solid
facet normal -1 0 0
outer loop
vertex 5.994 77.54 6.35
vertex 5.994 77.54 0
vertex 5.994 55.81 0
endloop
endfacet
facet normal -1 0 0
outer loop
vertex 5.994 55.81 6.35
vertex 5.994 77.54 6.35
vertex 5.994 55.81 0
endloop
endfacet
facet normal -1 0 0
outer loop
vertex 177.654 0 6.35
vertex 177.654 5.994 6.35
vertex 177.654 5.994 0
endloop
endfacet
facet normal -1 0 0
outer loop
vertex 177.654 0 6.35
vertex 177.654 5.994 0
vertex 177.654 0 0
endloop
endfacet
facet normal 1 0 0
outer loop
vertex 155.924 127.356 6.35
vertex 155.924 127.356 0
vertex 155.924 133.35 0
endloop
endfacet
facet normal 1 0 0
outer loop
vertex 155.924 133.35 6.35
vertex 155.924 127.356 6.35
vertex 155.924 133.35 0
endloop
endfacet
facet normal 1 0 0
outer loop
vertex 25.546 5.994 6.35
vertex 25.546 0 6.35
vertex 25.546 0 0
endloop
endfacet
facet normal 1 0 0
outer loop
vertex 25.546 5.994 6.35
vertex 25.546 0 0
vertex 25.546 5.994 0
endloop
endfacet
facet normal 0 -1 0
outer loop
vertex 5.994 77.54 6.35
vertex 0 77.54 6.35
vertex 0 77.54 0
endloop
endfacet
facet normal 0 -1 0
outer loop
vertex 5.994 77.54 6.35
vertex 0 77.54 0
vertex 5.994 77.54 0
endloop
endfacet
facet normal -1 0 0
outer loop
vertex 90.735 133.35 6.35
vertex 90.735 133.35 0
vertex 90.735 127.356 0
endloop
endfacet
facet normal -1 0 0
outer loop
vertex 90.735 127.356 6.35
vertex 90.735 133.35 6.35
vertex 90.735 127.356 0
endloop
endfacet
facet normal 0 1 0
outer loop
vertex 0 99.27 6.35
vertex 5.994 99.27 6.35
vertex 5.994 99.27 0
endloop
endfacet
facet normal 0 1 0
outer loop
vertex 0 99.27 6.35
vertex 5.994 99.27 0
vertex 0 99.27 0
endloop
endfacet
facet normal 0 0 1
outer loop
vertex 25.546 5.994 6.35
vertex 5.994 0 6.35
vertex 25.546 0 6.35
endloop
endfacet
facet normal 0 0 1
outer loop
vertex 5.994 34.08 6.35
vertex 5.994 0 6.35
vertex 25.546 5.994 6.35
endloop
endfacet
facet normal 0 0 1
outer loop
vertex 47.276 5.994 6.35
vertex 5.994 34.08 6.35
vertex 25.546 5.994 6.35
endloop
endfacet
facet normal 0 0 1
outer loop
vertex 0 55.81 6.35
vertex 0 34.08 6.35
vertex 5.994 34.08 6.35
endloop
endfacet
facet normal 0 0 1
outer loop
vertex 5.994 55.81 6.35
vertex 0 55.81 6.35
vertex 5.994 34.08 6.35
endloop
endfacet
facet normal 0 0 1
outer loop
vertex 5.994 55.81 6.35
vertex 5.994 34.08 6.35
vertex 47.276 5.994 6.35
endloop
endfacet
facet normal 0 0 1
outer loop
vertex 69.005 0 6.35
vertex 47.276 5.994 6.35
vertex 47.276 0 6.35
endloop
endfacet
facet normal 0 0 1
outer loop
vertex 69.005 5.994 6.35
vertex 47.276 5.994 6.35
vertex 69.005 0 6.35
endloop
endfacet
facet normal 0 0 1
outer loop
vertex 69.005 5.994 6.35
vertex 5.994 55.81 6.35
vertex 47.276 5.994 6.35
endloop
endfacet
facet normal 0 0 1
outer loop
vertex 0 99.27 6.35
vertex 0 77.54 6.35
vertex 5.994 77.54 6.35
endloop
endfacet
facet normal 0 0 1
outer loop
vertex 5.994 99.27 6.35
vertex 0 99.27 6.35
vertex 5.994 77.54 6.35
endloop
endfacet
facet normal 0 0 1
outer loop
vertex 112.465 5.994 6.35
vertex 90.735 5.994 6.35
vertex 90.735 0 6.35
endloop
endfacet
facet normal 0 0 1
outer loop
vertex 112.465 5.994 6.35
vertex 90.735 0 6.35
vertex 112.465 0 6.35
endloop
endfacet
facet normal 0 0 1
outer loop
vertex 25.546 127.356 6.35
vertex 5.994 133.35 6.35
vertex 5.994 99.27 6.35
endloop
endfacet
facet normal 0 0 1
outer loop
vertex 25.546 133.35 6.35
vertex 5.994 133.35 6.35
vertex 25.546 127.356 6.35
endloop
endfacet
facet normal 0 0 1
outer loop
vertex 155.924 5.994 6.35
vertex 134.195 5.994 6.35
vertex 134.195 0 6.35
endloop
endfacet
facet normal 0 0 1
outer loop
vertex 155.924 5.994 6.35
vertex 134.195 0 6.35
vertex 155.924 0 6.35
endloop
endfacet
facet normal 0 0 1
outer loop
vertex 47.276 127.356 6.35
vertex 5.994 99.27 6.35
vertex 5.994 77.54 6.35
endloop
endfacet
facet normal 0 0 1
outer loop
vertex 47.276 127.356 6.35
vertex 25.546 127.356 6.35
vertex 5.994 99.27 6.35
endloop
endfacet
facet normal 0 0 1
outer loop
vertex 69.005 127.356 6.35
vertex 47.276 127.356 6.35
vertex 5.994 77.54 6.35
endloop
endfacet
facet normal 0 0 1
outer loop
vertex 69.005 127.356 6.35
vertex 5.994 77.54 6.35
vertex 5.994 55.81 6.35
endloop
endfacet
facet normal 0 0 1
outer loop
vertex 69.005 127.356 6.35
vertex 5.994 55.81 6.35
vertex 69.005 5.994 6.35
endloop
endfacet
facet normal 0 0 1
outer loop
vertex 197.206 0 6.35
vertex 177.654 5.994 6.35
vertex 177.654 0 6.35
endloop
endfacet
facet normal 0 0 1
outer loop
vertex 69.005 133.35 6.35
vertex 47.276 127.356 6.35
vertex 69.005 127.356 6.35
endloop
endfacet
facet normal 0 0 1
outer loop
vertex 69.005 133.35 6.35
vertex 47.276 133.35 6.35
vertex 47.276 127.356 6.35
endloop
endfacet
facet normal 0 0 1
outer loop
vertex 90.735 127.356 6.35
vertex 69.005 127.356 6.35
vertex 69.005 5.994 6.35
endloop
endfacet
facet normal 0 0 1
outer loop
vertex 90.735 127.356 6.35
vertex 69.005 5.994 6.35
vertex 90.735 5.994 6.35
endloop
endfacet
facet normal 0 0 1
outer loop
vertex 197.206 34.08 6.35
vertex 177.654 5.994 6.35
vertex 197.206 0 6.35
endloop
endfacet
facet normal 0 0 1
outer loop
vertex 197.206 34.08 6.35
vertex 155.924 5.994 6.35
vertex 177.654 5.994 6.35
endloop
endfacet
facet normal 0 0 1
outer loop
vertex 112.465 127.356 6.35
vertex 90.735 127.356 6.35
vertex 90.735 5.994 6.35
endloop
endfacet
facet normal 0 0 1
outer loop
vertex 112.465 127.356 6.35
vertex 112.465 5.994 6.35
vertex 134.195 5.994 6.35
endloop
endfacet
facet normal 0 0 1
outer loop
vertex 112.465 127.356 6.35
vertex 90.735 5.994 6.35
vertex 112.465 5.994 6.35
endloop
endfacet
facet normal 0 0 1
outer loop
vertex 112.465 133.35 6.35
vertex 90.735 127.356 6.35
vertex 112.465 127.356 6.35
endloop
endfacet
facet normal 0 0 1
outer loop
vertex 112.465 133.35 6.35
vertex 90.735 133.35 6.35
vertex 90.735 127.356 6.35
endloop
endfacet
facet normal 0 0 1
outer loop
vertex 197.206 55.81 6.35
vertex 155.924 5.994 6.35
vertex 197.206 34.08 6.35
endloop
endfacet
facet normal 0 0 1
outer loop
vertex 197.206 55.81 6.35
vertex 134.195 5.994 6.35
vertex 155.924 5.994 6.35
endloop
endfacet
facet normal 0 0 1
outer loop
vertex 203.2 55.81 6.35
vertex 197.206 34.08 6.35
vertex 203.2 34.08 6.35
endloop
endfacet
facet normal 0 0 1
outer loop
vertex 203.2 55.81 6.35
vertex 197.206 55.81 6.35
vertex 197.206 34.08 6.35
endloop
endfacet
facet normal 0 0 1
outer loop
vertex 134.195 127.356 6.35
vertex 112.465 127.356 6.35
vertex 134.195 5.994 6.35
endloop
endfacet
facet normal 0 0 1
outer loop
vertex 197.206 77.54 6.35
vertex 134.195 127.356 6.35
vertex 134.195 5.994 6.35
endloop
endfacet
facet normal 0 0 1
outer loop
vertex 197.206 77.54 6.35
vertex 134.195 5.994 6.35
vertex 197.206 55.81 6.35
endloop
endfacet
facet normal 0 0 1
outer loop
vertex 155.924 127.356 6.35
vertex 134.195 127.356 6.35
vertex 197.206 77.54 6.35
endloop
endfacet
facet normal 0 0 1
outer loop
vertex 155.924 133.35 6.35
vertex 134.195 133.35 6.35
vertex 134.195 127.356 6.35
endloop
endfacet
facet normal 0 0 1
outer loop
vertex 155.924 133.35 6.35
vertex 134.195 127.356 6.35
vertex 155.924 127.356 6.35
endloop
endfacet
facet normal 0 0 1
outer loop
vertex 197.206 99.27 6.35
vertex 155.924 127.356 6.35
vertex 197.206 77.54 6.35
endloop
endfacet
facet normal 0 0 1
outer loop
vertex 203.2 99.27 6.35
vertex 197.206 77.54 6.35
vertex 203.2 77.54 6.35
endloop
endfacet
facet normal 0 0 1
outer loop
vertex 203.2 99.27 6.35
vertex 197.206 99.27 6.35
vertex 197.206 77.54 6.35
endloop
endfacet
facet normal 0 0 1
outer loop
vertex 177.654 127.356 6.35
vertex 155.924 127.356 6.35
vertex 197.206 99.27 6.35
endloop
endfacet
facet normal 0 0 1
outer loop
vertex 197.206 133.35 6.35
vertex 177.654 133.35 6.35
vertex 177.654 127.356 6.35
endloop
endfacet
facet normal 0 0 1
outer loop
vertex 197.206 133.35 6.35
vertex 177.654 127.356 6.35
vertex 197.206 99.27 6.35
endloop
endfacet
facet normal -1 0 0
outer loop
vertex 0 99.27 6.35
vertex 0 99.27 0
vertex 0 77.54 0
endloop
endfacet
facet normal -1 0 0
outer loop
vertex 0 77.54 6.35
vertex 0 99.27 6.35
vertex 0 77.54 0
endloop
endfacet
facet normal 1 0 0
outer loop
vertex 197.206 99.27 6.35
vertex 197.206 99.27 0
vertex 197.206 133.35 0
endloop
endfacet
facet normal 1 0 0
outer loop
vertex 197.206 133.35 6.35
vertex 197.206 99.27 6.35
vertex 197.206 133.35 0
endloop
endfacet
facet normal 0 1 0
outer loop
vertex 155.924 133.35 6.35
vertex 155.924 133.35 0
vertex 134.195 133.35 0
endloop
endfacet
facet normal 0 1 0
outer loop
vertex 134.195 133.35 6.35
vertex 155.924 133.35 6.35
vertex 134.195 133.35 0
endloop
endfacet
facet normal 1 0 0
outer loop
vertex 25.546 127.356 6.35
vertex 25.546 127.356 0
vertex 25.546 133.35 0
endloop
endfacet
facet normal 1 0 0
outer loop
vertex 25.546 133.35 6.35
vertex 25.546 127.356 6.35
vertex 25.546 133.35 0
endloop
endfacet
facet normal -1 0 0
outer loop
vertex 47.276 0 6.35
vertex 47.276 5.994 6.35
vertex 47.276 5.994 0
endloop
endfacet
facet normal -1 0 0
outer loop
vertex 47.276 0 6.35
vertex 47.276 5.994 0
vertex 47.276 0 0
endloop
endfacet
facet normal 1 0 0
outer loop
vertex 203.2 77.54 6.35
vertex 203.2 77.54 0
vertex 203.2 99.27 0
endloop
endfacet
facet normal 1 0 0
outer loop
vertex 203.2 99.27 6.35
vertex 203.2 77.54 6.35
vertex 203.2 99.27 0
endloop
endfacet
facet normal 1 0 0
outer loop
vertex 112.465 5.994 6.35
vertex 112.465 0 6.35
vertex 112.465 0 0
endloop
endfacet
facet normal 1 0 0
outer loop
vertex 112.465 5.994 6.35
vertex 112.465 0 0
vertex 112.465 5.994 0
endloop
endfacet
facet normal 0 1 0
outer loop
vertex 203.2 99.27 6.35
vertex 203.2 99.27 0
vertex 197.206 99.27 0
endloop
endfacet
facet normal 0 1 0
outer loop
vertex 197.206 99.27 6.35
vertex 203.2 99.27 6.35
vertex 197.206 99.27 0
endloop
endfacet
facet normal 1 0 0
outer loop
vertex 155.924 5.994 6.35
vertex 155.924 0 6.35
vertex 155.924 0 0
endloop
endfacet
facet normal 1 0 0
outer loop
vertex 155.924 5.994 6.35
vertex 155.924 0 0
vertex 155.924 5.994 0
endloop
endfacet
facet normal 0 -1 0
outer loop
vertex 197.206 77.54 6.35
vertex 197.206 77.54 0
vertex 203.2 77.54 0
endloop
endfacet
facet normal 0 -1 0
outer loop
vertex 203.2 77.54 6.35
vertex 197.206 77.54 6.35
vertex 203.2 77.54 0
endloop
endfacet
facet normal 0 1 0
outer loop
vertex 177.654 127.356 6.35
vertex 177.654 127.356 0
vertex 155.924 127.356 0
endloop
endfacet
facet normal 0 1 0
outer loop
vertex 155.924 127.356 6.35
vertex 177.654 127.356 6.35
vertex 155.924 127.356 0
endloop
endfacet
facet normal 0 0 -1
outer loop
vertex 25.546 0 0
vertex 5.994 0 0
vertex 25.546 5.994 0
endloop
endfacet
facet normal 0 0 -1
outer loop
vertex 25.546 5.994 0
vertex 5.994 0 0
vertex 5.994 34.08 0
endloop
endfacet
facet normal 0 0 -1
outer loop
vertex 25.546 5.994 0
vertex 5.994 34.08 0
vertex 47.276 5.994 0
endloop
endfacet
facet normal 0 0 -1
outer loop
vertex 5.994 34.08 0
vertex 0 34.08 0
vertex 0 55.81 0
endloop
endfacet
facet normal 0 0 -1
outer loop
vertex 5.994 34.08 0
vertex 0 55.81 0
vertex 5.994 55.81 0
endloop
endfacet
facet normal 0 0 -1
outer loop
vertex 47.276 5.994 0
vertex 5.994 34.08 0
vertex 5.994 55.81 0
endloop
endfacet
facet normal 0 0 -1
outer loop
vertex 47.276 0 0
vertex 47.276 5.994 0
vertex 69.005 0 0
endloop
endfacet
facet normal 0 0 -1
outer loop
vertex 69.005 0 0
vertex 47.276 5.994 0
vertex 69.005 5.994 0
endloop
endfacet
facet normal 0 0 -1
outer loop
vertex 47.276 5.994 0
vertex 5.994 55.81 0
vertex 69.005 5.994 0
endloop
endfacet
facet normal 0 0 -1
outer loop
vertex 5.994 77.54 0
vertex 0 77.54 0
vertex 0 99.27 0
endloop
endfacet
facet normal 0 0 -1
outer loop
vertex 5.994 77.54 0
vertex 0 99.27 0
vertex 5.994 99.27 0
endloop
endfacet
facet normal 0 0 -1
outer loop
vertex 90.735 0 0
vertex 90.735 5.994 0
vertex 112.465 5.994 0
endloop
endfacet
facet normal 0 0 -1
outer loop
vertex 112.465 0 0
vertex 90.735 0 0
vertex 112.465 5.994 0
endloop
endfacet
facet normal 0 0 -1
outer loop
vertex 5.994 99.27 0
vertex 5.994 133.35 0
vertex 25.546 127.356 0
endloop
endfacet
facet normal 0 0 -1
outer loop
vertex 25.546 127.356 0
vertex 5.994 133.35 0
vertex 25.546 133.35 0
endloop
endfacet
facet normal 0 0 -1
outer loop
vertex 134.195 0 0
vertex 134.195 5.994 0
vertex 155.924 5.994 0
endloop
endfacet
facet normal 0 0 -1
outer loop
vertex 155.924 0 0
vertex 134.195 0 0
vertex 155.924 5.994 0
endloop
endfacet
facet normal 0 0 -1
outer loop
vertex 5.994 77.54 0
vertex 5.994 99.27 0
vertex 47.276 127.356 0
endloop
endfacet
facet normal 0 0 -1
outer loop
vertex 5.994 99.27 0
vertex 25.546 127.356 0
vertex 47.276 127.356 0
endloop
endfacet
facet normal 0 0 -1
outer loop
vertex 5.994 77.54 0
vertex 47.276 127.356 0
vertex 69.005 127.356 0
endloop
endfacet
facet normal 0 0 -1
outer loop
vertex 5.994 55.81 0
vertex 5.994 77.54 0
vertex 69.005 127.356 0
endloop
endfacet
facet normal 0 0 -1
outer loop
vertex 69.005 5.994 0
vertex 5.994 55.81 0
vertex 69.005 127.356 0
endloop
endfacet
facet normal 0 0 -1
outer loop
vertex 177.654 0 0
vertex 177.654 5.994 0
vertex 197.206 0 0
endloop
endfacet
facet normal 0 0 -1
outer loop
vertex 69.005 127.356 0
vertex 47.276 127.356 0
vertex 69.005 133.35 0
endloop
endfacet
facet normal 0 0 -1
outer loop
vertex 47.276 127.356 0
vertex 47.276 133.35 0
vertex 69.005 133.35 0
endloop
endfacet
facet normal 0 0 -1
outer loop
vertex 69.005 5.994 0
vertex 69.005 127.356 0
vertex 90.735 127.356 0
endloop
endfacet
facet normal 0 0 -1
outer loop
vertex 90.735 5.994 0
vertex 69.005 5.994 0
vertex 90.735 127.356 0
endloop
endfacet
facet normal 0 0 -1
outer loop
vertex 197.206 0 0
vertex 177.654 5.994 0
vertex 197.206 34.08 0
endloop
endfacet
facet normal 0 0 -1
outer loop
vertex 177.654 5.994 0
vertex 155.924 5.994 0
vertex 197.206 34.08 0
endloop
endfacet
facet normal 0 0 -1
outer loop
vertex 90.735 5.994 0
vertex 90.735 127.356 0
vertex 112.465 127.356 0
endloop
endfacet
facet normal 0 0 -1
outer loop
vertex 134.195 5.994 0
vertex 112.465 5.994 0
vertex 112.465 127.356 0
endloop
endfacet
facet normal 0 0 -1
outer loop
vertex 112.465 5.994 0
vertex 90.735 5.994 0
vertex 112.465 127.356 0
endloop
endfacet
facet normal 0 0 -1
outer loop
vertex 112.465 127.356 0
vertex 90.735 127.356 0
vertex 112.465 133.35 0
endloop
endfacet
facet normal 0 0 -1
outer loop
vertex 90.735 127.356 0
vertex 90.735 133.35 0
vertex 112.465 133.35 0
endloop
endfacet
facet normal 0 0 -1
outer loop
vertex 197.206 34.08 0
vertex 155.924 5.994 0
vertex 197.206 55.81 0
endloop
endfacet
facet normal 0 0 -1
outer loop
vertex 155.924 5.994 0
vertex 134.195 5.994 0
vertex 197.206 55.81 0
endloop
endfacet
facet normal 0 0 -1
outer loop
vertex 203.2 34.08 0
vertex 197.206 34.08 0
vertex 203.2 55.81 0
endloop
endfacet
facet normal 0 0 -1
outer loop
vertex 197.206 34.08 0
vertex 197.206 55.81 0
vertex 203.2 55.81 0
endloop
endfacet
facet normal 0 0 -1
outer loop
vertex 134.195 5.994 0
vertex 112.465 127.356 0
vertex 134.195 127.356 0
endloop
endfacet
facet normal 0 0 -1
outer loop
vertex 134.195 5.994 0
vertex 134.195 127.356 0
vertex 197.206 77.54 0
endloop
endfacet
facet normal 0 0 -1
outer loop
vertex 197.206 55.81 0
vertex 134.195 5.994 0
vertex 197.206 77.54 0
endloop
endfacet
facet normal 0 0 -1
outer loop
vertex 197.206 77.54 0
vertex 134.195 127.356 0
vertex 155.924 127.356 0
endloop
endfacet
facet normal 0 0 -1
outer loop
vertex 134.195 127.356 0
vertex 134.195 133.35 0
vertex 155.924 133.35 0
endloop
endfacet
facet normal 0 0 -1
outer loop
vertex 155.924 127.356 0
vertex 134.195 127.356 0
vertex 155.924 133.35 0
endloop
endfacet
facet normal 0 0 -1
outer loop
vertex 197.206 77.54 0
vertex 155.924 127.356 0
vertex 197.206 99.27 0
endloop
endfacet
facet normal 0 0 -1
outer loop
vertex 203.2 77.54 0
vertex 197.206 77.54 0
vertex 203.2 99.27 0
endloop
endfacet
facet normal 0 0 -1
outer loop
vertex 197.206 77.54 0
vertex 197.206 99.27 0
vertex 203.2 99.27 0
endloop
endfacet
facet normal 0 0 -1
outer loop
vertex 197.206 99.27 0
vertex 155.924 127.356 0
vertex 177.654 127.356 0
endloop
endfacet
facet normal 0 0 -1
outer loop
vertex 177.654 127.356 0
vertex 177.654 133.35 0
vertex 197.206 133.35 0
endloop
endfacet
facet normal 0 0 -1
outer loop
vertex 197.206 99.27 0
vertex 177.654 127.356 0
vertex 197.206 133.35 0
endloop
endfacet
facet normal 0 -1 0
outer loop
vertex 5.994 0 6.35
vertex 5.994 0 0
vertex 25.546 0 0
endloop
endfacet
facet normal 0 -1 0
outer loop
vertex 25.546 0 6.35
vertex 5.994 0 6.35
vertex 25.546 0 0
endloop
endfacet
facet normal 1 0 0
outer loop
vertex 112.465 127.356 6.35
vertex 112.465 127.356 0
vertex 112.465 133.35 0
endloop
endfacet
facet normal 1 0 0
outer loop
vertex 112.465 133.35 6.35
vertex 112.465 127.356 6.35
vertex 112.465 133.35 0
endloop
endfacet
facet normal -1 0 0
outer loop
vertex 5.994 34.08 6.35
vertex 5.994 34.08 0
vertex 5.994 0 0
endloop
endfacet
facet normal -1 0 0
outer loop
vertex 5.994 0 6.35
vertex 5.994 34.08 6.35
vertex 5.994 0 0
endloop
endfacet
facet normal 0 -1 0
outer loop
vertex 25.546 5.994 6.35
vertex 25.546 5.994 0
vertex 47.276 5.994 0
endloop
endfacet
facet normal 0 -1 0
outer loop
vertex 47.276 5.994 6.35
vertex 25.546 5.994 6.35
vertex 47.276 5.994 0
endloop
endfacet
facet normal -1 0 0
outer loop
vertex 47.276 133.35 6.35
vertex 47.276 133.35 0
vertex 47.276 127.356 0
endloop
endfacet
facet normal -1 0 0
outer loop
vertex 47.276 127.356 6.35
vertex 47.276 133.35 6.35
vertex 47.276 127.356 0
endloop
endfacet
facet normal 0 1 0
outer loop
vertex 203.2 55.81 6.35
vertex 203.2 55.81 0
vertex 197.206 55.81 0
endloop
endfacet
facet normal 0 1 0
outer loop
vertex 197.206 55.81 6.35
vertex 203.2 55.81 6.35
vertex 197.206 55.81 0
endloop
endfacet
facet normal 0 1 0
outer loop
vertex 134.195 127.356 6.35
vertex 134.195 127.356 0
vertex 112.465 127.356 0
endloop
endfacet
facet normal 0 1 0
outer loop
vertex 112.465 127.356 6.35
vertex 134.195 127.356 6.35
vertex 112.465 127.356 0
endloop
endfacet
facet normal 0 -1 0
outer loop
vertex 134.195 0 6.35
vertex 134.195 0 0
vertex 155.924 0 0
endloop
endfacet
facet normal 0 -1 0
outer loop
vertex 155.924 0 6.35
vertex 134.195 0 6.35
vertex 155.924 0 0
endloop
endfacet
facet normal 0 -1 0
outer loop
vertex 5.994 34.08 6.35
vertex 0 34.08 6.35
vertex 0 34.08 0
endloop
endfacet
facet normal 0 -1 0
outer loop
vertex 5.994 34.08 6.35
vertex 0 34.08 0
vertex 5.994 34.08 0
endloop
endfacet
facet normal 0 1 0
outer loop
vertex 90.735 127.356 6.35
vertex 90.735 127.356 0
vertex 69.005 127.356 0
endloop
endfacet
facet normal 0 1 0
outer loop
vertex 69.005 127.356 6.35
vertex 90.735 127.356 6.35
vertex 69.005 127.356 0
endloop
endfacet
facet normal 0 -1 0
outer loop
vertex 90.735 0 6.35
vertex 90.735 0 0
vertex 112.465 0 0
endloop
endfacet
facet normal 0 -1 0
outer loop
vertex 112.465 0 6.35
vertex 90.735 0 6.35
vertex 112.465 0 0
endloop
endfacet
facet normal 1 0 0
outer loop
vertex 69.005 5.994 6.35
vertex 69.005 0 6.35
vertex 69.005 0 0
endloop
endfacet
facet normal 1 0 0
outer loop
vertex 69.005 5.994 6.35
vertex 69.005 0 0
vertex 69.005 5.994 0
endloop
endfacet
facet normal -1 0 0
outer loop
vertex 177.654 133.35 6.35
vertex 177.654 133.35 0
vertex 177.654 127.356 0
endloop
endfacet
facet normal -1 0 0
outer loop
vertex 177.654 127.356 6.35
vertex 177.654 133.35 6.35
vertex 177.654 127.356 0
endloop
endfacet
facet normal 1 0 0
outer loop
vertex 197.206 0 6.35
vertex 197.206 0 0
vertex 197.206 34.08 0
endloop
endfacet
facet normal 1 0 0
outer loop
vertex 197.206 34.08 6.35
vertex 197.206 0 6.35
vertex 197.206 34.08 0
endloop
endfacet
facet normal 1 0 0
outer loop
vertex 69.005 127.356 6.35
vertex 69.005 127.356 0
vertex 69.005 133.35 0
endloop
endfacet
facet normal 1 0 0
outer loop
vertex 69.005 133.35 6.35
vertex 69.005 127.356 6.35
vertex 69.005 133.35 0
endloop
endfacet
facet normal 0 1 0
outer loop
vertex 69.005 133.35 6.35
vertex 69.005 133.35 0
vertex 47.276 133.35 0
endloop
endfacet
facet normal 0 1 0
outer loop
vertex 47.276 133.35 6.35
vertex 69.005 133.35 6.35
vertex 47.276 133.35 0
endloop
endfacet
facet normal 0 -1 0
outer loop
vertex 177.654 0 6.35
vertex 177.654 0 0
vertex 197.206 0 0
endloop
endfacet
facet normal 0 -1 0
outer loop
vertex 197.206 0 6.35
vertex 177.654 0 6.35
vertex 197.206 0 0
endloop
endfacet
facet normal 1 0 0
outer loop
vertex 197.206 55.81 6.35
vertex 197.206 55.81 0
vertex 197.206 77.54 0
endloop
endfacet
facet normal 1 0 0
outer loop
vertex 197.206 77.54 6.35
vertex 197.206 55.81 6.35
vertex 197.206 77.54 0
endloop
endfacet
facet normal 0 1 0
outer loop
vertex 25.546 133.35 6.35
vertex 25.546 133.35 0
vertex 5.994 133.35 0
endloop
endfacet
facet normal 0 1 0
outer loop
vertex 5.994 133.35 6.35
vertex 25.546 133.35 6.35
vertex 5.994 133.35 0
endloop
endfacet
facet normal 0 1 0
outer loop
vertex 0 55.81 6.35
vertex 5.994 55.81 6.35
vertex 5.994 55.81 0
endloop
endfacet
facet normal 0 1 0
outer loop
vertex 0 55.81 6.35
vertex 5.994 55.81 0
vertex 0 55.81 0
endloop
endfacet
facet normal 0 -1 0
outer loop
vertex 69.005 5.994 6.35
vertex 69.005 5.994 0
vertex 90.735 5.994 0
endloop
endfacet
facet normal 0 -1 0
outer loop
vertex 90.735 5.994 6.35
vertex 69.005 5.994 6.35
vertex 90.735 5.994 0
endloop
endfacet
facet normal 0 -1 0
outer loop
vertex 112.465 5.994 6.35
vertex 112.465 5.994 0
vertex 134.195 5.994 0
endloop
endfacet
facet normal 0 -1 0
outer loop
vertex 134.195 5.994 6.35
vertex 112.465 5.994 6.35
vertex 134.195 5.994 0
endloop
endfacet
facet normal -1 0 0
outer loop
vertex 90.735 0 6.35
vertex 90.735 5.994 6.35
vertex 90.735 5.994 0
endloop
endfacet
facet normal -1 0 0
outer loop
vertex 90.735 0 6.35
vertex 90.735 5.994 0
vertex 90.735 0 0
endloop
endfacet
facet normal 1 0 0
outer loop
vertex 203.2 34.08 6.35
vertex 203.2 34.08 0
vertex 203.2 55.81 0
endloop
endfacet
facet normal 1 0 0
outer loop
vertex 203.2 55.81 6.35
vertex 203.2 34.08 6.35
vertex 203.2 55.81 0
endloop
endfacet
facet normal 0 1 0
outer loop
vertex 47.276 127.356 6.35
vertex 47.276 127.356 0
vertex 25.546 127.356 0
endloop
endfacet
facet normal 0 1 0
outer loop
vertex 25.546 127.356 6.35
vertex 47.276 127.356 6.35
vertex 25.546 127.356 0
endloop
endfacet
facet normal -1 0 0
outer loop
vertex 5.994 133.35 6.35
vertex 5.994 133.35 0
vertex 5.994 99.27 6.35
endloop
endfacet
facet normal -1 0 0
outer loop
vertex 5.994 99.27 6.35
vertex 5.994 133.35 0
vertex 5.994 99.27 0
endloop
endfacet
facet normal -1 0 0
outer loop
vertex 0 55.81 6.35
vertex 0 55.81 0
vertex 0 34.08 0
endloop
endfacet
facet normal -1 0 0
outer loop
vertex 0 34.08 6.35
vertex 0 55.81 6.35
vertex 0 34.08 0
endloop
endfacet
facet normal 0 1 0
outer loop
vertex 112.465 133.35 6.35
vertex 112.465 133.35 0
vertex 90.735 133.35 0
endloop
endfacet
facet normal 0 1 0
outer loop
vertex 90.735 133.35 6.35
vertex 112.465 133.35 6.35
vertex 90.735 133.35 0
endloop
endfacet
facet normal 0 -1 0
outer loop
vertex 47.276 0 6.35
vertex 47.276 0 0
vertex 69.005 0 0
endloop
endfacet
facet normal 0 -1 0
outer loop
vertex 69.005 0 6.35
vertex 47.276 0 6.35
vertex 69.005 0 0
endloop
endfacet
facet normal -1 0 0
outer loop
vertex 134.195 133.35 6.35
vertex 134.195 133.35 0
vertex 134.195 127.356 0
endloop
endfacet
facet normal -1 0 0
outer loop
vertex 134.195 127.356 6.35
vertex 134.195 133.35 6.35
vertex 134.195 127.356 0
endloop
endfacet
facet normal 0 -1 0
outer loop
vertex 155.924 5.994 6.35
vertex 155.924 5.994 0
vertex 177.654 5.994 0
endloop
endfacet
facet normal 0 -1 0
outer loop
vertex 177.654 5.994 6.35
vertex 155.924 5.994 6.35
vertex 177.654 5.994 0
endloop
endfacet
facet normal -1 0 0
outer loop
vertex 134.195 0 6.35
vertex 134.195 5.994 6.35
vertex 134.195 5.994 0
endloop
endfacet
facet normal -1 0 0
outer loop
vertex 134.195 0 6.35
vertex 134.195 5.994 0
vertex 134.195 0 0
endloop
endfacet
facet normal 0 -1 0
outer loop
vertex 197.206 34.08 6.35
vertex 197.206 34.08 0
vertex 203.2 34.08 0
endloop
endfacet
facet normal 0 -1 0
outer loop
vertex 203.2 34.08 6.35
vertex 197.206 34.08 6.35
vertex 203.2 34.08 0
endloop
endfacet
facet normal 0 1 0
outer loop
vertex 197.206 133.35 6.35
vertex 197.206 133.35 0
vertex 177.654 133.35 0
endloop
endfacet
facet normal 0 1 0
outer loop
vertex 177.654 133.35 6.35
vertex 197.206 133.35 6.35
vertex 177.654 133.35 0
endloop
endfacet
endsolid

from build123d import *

# Parameters (mm, degrees)
BOSS_EXTRUDE1_DEPTH = 6.35


with BuildPart() as part:
    # Sketch3 → Boss-Extrude1 (new body)
    with BuildSketch(Plane.XY):
        Polygon((25.54605, 133.35), (5.9944, 133.35), (5.9944, 99.26955), (0, 99.26955), (0, 77.53985), (5.9944, 77.53985), (5.9944, 55.81015), (0, 55.81015), (0, 34.08045), (5.9944, 34.08045), (5.9944, 12.35075), (5.9944, 0), (25.54605, 0), (25.54605, 5.9944), (47.27575, 5.9944), (47.27575, 0), (69.00545, 0), (69.00545, 5.9944), (90.73515, 5.9944), (90.73515, 0), (112.46485, 0), (112.46485, 5.9944), (134.19455, 5.9944), (134.19455, 0), (155.92425, 0), (155.92425, 5.9944), (177.65395, 5.9944), (177.65395, 0), (197.2056, 0), (197.2056, 34.08045), (203.2, 34.08045), (203.2, 55.81015), (197.2056, 55.81015), (197.2056, 77.53985), (203.2, 77.53985), (203.2, 99.26955), (197.2056, 99.26955), (197.2056, 120.99925), (197.2056, 133.35), (177.65395, 133.35), (177.65395, 127.3556), (155.92425, 127.3556), (155.92425, 133.35), (134.19455, 133.35), (134.19455, 127.3556), (112.46485, 127.3556), (112.46485, 133.35), (90.73515, 133.35), (90.73515, 127.3556), (69.00545, 127.3556), (69.00545, 133.35), (47.27575, 133.35), (47.27575, 127.3556), (25.54605, 127.3556), align=None)
    extrude(amount=BOSS_EXTRUDE1_DEPTH)


solid = part.part
